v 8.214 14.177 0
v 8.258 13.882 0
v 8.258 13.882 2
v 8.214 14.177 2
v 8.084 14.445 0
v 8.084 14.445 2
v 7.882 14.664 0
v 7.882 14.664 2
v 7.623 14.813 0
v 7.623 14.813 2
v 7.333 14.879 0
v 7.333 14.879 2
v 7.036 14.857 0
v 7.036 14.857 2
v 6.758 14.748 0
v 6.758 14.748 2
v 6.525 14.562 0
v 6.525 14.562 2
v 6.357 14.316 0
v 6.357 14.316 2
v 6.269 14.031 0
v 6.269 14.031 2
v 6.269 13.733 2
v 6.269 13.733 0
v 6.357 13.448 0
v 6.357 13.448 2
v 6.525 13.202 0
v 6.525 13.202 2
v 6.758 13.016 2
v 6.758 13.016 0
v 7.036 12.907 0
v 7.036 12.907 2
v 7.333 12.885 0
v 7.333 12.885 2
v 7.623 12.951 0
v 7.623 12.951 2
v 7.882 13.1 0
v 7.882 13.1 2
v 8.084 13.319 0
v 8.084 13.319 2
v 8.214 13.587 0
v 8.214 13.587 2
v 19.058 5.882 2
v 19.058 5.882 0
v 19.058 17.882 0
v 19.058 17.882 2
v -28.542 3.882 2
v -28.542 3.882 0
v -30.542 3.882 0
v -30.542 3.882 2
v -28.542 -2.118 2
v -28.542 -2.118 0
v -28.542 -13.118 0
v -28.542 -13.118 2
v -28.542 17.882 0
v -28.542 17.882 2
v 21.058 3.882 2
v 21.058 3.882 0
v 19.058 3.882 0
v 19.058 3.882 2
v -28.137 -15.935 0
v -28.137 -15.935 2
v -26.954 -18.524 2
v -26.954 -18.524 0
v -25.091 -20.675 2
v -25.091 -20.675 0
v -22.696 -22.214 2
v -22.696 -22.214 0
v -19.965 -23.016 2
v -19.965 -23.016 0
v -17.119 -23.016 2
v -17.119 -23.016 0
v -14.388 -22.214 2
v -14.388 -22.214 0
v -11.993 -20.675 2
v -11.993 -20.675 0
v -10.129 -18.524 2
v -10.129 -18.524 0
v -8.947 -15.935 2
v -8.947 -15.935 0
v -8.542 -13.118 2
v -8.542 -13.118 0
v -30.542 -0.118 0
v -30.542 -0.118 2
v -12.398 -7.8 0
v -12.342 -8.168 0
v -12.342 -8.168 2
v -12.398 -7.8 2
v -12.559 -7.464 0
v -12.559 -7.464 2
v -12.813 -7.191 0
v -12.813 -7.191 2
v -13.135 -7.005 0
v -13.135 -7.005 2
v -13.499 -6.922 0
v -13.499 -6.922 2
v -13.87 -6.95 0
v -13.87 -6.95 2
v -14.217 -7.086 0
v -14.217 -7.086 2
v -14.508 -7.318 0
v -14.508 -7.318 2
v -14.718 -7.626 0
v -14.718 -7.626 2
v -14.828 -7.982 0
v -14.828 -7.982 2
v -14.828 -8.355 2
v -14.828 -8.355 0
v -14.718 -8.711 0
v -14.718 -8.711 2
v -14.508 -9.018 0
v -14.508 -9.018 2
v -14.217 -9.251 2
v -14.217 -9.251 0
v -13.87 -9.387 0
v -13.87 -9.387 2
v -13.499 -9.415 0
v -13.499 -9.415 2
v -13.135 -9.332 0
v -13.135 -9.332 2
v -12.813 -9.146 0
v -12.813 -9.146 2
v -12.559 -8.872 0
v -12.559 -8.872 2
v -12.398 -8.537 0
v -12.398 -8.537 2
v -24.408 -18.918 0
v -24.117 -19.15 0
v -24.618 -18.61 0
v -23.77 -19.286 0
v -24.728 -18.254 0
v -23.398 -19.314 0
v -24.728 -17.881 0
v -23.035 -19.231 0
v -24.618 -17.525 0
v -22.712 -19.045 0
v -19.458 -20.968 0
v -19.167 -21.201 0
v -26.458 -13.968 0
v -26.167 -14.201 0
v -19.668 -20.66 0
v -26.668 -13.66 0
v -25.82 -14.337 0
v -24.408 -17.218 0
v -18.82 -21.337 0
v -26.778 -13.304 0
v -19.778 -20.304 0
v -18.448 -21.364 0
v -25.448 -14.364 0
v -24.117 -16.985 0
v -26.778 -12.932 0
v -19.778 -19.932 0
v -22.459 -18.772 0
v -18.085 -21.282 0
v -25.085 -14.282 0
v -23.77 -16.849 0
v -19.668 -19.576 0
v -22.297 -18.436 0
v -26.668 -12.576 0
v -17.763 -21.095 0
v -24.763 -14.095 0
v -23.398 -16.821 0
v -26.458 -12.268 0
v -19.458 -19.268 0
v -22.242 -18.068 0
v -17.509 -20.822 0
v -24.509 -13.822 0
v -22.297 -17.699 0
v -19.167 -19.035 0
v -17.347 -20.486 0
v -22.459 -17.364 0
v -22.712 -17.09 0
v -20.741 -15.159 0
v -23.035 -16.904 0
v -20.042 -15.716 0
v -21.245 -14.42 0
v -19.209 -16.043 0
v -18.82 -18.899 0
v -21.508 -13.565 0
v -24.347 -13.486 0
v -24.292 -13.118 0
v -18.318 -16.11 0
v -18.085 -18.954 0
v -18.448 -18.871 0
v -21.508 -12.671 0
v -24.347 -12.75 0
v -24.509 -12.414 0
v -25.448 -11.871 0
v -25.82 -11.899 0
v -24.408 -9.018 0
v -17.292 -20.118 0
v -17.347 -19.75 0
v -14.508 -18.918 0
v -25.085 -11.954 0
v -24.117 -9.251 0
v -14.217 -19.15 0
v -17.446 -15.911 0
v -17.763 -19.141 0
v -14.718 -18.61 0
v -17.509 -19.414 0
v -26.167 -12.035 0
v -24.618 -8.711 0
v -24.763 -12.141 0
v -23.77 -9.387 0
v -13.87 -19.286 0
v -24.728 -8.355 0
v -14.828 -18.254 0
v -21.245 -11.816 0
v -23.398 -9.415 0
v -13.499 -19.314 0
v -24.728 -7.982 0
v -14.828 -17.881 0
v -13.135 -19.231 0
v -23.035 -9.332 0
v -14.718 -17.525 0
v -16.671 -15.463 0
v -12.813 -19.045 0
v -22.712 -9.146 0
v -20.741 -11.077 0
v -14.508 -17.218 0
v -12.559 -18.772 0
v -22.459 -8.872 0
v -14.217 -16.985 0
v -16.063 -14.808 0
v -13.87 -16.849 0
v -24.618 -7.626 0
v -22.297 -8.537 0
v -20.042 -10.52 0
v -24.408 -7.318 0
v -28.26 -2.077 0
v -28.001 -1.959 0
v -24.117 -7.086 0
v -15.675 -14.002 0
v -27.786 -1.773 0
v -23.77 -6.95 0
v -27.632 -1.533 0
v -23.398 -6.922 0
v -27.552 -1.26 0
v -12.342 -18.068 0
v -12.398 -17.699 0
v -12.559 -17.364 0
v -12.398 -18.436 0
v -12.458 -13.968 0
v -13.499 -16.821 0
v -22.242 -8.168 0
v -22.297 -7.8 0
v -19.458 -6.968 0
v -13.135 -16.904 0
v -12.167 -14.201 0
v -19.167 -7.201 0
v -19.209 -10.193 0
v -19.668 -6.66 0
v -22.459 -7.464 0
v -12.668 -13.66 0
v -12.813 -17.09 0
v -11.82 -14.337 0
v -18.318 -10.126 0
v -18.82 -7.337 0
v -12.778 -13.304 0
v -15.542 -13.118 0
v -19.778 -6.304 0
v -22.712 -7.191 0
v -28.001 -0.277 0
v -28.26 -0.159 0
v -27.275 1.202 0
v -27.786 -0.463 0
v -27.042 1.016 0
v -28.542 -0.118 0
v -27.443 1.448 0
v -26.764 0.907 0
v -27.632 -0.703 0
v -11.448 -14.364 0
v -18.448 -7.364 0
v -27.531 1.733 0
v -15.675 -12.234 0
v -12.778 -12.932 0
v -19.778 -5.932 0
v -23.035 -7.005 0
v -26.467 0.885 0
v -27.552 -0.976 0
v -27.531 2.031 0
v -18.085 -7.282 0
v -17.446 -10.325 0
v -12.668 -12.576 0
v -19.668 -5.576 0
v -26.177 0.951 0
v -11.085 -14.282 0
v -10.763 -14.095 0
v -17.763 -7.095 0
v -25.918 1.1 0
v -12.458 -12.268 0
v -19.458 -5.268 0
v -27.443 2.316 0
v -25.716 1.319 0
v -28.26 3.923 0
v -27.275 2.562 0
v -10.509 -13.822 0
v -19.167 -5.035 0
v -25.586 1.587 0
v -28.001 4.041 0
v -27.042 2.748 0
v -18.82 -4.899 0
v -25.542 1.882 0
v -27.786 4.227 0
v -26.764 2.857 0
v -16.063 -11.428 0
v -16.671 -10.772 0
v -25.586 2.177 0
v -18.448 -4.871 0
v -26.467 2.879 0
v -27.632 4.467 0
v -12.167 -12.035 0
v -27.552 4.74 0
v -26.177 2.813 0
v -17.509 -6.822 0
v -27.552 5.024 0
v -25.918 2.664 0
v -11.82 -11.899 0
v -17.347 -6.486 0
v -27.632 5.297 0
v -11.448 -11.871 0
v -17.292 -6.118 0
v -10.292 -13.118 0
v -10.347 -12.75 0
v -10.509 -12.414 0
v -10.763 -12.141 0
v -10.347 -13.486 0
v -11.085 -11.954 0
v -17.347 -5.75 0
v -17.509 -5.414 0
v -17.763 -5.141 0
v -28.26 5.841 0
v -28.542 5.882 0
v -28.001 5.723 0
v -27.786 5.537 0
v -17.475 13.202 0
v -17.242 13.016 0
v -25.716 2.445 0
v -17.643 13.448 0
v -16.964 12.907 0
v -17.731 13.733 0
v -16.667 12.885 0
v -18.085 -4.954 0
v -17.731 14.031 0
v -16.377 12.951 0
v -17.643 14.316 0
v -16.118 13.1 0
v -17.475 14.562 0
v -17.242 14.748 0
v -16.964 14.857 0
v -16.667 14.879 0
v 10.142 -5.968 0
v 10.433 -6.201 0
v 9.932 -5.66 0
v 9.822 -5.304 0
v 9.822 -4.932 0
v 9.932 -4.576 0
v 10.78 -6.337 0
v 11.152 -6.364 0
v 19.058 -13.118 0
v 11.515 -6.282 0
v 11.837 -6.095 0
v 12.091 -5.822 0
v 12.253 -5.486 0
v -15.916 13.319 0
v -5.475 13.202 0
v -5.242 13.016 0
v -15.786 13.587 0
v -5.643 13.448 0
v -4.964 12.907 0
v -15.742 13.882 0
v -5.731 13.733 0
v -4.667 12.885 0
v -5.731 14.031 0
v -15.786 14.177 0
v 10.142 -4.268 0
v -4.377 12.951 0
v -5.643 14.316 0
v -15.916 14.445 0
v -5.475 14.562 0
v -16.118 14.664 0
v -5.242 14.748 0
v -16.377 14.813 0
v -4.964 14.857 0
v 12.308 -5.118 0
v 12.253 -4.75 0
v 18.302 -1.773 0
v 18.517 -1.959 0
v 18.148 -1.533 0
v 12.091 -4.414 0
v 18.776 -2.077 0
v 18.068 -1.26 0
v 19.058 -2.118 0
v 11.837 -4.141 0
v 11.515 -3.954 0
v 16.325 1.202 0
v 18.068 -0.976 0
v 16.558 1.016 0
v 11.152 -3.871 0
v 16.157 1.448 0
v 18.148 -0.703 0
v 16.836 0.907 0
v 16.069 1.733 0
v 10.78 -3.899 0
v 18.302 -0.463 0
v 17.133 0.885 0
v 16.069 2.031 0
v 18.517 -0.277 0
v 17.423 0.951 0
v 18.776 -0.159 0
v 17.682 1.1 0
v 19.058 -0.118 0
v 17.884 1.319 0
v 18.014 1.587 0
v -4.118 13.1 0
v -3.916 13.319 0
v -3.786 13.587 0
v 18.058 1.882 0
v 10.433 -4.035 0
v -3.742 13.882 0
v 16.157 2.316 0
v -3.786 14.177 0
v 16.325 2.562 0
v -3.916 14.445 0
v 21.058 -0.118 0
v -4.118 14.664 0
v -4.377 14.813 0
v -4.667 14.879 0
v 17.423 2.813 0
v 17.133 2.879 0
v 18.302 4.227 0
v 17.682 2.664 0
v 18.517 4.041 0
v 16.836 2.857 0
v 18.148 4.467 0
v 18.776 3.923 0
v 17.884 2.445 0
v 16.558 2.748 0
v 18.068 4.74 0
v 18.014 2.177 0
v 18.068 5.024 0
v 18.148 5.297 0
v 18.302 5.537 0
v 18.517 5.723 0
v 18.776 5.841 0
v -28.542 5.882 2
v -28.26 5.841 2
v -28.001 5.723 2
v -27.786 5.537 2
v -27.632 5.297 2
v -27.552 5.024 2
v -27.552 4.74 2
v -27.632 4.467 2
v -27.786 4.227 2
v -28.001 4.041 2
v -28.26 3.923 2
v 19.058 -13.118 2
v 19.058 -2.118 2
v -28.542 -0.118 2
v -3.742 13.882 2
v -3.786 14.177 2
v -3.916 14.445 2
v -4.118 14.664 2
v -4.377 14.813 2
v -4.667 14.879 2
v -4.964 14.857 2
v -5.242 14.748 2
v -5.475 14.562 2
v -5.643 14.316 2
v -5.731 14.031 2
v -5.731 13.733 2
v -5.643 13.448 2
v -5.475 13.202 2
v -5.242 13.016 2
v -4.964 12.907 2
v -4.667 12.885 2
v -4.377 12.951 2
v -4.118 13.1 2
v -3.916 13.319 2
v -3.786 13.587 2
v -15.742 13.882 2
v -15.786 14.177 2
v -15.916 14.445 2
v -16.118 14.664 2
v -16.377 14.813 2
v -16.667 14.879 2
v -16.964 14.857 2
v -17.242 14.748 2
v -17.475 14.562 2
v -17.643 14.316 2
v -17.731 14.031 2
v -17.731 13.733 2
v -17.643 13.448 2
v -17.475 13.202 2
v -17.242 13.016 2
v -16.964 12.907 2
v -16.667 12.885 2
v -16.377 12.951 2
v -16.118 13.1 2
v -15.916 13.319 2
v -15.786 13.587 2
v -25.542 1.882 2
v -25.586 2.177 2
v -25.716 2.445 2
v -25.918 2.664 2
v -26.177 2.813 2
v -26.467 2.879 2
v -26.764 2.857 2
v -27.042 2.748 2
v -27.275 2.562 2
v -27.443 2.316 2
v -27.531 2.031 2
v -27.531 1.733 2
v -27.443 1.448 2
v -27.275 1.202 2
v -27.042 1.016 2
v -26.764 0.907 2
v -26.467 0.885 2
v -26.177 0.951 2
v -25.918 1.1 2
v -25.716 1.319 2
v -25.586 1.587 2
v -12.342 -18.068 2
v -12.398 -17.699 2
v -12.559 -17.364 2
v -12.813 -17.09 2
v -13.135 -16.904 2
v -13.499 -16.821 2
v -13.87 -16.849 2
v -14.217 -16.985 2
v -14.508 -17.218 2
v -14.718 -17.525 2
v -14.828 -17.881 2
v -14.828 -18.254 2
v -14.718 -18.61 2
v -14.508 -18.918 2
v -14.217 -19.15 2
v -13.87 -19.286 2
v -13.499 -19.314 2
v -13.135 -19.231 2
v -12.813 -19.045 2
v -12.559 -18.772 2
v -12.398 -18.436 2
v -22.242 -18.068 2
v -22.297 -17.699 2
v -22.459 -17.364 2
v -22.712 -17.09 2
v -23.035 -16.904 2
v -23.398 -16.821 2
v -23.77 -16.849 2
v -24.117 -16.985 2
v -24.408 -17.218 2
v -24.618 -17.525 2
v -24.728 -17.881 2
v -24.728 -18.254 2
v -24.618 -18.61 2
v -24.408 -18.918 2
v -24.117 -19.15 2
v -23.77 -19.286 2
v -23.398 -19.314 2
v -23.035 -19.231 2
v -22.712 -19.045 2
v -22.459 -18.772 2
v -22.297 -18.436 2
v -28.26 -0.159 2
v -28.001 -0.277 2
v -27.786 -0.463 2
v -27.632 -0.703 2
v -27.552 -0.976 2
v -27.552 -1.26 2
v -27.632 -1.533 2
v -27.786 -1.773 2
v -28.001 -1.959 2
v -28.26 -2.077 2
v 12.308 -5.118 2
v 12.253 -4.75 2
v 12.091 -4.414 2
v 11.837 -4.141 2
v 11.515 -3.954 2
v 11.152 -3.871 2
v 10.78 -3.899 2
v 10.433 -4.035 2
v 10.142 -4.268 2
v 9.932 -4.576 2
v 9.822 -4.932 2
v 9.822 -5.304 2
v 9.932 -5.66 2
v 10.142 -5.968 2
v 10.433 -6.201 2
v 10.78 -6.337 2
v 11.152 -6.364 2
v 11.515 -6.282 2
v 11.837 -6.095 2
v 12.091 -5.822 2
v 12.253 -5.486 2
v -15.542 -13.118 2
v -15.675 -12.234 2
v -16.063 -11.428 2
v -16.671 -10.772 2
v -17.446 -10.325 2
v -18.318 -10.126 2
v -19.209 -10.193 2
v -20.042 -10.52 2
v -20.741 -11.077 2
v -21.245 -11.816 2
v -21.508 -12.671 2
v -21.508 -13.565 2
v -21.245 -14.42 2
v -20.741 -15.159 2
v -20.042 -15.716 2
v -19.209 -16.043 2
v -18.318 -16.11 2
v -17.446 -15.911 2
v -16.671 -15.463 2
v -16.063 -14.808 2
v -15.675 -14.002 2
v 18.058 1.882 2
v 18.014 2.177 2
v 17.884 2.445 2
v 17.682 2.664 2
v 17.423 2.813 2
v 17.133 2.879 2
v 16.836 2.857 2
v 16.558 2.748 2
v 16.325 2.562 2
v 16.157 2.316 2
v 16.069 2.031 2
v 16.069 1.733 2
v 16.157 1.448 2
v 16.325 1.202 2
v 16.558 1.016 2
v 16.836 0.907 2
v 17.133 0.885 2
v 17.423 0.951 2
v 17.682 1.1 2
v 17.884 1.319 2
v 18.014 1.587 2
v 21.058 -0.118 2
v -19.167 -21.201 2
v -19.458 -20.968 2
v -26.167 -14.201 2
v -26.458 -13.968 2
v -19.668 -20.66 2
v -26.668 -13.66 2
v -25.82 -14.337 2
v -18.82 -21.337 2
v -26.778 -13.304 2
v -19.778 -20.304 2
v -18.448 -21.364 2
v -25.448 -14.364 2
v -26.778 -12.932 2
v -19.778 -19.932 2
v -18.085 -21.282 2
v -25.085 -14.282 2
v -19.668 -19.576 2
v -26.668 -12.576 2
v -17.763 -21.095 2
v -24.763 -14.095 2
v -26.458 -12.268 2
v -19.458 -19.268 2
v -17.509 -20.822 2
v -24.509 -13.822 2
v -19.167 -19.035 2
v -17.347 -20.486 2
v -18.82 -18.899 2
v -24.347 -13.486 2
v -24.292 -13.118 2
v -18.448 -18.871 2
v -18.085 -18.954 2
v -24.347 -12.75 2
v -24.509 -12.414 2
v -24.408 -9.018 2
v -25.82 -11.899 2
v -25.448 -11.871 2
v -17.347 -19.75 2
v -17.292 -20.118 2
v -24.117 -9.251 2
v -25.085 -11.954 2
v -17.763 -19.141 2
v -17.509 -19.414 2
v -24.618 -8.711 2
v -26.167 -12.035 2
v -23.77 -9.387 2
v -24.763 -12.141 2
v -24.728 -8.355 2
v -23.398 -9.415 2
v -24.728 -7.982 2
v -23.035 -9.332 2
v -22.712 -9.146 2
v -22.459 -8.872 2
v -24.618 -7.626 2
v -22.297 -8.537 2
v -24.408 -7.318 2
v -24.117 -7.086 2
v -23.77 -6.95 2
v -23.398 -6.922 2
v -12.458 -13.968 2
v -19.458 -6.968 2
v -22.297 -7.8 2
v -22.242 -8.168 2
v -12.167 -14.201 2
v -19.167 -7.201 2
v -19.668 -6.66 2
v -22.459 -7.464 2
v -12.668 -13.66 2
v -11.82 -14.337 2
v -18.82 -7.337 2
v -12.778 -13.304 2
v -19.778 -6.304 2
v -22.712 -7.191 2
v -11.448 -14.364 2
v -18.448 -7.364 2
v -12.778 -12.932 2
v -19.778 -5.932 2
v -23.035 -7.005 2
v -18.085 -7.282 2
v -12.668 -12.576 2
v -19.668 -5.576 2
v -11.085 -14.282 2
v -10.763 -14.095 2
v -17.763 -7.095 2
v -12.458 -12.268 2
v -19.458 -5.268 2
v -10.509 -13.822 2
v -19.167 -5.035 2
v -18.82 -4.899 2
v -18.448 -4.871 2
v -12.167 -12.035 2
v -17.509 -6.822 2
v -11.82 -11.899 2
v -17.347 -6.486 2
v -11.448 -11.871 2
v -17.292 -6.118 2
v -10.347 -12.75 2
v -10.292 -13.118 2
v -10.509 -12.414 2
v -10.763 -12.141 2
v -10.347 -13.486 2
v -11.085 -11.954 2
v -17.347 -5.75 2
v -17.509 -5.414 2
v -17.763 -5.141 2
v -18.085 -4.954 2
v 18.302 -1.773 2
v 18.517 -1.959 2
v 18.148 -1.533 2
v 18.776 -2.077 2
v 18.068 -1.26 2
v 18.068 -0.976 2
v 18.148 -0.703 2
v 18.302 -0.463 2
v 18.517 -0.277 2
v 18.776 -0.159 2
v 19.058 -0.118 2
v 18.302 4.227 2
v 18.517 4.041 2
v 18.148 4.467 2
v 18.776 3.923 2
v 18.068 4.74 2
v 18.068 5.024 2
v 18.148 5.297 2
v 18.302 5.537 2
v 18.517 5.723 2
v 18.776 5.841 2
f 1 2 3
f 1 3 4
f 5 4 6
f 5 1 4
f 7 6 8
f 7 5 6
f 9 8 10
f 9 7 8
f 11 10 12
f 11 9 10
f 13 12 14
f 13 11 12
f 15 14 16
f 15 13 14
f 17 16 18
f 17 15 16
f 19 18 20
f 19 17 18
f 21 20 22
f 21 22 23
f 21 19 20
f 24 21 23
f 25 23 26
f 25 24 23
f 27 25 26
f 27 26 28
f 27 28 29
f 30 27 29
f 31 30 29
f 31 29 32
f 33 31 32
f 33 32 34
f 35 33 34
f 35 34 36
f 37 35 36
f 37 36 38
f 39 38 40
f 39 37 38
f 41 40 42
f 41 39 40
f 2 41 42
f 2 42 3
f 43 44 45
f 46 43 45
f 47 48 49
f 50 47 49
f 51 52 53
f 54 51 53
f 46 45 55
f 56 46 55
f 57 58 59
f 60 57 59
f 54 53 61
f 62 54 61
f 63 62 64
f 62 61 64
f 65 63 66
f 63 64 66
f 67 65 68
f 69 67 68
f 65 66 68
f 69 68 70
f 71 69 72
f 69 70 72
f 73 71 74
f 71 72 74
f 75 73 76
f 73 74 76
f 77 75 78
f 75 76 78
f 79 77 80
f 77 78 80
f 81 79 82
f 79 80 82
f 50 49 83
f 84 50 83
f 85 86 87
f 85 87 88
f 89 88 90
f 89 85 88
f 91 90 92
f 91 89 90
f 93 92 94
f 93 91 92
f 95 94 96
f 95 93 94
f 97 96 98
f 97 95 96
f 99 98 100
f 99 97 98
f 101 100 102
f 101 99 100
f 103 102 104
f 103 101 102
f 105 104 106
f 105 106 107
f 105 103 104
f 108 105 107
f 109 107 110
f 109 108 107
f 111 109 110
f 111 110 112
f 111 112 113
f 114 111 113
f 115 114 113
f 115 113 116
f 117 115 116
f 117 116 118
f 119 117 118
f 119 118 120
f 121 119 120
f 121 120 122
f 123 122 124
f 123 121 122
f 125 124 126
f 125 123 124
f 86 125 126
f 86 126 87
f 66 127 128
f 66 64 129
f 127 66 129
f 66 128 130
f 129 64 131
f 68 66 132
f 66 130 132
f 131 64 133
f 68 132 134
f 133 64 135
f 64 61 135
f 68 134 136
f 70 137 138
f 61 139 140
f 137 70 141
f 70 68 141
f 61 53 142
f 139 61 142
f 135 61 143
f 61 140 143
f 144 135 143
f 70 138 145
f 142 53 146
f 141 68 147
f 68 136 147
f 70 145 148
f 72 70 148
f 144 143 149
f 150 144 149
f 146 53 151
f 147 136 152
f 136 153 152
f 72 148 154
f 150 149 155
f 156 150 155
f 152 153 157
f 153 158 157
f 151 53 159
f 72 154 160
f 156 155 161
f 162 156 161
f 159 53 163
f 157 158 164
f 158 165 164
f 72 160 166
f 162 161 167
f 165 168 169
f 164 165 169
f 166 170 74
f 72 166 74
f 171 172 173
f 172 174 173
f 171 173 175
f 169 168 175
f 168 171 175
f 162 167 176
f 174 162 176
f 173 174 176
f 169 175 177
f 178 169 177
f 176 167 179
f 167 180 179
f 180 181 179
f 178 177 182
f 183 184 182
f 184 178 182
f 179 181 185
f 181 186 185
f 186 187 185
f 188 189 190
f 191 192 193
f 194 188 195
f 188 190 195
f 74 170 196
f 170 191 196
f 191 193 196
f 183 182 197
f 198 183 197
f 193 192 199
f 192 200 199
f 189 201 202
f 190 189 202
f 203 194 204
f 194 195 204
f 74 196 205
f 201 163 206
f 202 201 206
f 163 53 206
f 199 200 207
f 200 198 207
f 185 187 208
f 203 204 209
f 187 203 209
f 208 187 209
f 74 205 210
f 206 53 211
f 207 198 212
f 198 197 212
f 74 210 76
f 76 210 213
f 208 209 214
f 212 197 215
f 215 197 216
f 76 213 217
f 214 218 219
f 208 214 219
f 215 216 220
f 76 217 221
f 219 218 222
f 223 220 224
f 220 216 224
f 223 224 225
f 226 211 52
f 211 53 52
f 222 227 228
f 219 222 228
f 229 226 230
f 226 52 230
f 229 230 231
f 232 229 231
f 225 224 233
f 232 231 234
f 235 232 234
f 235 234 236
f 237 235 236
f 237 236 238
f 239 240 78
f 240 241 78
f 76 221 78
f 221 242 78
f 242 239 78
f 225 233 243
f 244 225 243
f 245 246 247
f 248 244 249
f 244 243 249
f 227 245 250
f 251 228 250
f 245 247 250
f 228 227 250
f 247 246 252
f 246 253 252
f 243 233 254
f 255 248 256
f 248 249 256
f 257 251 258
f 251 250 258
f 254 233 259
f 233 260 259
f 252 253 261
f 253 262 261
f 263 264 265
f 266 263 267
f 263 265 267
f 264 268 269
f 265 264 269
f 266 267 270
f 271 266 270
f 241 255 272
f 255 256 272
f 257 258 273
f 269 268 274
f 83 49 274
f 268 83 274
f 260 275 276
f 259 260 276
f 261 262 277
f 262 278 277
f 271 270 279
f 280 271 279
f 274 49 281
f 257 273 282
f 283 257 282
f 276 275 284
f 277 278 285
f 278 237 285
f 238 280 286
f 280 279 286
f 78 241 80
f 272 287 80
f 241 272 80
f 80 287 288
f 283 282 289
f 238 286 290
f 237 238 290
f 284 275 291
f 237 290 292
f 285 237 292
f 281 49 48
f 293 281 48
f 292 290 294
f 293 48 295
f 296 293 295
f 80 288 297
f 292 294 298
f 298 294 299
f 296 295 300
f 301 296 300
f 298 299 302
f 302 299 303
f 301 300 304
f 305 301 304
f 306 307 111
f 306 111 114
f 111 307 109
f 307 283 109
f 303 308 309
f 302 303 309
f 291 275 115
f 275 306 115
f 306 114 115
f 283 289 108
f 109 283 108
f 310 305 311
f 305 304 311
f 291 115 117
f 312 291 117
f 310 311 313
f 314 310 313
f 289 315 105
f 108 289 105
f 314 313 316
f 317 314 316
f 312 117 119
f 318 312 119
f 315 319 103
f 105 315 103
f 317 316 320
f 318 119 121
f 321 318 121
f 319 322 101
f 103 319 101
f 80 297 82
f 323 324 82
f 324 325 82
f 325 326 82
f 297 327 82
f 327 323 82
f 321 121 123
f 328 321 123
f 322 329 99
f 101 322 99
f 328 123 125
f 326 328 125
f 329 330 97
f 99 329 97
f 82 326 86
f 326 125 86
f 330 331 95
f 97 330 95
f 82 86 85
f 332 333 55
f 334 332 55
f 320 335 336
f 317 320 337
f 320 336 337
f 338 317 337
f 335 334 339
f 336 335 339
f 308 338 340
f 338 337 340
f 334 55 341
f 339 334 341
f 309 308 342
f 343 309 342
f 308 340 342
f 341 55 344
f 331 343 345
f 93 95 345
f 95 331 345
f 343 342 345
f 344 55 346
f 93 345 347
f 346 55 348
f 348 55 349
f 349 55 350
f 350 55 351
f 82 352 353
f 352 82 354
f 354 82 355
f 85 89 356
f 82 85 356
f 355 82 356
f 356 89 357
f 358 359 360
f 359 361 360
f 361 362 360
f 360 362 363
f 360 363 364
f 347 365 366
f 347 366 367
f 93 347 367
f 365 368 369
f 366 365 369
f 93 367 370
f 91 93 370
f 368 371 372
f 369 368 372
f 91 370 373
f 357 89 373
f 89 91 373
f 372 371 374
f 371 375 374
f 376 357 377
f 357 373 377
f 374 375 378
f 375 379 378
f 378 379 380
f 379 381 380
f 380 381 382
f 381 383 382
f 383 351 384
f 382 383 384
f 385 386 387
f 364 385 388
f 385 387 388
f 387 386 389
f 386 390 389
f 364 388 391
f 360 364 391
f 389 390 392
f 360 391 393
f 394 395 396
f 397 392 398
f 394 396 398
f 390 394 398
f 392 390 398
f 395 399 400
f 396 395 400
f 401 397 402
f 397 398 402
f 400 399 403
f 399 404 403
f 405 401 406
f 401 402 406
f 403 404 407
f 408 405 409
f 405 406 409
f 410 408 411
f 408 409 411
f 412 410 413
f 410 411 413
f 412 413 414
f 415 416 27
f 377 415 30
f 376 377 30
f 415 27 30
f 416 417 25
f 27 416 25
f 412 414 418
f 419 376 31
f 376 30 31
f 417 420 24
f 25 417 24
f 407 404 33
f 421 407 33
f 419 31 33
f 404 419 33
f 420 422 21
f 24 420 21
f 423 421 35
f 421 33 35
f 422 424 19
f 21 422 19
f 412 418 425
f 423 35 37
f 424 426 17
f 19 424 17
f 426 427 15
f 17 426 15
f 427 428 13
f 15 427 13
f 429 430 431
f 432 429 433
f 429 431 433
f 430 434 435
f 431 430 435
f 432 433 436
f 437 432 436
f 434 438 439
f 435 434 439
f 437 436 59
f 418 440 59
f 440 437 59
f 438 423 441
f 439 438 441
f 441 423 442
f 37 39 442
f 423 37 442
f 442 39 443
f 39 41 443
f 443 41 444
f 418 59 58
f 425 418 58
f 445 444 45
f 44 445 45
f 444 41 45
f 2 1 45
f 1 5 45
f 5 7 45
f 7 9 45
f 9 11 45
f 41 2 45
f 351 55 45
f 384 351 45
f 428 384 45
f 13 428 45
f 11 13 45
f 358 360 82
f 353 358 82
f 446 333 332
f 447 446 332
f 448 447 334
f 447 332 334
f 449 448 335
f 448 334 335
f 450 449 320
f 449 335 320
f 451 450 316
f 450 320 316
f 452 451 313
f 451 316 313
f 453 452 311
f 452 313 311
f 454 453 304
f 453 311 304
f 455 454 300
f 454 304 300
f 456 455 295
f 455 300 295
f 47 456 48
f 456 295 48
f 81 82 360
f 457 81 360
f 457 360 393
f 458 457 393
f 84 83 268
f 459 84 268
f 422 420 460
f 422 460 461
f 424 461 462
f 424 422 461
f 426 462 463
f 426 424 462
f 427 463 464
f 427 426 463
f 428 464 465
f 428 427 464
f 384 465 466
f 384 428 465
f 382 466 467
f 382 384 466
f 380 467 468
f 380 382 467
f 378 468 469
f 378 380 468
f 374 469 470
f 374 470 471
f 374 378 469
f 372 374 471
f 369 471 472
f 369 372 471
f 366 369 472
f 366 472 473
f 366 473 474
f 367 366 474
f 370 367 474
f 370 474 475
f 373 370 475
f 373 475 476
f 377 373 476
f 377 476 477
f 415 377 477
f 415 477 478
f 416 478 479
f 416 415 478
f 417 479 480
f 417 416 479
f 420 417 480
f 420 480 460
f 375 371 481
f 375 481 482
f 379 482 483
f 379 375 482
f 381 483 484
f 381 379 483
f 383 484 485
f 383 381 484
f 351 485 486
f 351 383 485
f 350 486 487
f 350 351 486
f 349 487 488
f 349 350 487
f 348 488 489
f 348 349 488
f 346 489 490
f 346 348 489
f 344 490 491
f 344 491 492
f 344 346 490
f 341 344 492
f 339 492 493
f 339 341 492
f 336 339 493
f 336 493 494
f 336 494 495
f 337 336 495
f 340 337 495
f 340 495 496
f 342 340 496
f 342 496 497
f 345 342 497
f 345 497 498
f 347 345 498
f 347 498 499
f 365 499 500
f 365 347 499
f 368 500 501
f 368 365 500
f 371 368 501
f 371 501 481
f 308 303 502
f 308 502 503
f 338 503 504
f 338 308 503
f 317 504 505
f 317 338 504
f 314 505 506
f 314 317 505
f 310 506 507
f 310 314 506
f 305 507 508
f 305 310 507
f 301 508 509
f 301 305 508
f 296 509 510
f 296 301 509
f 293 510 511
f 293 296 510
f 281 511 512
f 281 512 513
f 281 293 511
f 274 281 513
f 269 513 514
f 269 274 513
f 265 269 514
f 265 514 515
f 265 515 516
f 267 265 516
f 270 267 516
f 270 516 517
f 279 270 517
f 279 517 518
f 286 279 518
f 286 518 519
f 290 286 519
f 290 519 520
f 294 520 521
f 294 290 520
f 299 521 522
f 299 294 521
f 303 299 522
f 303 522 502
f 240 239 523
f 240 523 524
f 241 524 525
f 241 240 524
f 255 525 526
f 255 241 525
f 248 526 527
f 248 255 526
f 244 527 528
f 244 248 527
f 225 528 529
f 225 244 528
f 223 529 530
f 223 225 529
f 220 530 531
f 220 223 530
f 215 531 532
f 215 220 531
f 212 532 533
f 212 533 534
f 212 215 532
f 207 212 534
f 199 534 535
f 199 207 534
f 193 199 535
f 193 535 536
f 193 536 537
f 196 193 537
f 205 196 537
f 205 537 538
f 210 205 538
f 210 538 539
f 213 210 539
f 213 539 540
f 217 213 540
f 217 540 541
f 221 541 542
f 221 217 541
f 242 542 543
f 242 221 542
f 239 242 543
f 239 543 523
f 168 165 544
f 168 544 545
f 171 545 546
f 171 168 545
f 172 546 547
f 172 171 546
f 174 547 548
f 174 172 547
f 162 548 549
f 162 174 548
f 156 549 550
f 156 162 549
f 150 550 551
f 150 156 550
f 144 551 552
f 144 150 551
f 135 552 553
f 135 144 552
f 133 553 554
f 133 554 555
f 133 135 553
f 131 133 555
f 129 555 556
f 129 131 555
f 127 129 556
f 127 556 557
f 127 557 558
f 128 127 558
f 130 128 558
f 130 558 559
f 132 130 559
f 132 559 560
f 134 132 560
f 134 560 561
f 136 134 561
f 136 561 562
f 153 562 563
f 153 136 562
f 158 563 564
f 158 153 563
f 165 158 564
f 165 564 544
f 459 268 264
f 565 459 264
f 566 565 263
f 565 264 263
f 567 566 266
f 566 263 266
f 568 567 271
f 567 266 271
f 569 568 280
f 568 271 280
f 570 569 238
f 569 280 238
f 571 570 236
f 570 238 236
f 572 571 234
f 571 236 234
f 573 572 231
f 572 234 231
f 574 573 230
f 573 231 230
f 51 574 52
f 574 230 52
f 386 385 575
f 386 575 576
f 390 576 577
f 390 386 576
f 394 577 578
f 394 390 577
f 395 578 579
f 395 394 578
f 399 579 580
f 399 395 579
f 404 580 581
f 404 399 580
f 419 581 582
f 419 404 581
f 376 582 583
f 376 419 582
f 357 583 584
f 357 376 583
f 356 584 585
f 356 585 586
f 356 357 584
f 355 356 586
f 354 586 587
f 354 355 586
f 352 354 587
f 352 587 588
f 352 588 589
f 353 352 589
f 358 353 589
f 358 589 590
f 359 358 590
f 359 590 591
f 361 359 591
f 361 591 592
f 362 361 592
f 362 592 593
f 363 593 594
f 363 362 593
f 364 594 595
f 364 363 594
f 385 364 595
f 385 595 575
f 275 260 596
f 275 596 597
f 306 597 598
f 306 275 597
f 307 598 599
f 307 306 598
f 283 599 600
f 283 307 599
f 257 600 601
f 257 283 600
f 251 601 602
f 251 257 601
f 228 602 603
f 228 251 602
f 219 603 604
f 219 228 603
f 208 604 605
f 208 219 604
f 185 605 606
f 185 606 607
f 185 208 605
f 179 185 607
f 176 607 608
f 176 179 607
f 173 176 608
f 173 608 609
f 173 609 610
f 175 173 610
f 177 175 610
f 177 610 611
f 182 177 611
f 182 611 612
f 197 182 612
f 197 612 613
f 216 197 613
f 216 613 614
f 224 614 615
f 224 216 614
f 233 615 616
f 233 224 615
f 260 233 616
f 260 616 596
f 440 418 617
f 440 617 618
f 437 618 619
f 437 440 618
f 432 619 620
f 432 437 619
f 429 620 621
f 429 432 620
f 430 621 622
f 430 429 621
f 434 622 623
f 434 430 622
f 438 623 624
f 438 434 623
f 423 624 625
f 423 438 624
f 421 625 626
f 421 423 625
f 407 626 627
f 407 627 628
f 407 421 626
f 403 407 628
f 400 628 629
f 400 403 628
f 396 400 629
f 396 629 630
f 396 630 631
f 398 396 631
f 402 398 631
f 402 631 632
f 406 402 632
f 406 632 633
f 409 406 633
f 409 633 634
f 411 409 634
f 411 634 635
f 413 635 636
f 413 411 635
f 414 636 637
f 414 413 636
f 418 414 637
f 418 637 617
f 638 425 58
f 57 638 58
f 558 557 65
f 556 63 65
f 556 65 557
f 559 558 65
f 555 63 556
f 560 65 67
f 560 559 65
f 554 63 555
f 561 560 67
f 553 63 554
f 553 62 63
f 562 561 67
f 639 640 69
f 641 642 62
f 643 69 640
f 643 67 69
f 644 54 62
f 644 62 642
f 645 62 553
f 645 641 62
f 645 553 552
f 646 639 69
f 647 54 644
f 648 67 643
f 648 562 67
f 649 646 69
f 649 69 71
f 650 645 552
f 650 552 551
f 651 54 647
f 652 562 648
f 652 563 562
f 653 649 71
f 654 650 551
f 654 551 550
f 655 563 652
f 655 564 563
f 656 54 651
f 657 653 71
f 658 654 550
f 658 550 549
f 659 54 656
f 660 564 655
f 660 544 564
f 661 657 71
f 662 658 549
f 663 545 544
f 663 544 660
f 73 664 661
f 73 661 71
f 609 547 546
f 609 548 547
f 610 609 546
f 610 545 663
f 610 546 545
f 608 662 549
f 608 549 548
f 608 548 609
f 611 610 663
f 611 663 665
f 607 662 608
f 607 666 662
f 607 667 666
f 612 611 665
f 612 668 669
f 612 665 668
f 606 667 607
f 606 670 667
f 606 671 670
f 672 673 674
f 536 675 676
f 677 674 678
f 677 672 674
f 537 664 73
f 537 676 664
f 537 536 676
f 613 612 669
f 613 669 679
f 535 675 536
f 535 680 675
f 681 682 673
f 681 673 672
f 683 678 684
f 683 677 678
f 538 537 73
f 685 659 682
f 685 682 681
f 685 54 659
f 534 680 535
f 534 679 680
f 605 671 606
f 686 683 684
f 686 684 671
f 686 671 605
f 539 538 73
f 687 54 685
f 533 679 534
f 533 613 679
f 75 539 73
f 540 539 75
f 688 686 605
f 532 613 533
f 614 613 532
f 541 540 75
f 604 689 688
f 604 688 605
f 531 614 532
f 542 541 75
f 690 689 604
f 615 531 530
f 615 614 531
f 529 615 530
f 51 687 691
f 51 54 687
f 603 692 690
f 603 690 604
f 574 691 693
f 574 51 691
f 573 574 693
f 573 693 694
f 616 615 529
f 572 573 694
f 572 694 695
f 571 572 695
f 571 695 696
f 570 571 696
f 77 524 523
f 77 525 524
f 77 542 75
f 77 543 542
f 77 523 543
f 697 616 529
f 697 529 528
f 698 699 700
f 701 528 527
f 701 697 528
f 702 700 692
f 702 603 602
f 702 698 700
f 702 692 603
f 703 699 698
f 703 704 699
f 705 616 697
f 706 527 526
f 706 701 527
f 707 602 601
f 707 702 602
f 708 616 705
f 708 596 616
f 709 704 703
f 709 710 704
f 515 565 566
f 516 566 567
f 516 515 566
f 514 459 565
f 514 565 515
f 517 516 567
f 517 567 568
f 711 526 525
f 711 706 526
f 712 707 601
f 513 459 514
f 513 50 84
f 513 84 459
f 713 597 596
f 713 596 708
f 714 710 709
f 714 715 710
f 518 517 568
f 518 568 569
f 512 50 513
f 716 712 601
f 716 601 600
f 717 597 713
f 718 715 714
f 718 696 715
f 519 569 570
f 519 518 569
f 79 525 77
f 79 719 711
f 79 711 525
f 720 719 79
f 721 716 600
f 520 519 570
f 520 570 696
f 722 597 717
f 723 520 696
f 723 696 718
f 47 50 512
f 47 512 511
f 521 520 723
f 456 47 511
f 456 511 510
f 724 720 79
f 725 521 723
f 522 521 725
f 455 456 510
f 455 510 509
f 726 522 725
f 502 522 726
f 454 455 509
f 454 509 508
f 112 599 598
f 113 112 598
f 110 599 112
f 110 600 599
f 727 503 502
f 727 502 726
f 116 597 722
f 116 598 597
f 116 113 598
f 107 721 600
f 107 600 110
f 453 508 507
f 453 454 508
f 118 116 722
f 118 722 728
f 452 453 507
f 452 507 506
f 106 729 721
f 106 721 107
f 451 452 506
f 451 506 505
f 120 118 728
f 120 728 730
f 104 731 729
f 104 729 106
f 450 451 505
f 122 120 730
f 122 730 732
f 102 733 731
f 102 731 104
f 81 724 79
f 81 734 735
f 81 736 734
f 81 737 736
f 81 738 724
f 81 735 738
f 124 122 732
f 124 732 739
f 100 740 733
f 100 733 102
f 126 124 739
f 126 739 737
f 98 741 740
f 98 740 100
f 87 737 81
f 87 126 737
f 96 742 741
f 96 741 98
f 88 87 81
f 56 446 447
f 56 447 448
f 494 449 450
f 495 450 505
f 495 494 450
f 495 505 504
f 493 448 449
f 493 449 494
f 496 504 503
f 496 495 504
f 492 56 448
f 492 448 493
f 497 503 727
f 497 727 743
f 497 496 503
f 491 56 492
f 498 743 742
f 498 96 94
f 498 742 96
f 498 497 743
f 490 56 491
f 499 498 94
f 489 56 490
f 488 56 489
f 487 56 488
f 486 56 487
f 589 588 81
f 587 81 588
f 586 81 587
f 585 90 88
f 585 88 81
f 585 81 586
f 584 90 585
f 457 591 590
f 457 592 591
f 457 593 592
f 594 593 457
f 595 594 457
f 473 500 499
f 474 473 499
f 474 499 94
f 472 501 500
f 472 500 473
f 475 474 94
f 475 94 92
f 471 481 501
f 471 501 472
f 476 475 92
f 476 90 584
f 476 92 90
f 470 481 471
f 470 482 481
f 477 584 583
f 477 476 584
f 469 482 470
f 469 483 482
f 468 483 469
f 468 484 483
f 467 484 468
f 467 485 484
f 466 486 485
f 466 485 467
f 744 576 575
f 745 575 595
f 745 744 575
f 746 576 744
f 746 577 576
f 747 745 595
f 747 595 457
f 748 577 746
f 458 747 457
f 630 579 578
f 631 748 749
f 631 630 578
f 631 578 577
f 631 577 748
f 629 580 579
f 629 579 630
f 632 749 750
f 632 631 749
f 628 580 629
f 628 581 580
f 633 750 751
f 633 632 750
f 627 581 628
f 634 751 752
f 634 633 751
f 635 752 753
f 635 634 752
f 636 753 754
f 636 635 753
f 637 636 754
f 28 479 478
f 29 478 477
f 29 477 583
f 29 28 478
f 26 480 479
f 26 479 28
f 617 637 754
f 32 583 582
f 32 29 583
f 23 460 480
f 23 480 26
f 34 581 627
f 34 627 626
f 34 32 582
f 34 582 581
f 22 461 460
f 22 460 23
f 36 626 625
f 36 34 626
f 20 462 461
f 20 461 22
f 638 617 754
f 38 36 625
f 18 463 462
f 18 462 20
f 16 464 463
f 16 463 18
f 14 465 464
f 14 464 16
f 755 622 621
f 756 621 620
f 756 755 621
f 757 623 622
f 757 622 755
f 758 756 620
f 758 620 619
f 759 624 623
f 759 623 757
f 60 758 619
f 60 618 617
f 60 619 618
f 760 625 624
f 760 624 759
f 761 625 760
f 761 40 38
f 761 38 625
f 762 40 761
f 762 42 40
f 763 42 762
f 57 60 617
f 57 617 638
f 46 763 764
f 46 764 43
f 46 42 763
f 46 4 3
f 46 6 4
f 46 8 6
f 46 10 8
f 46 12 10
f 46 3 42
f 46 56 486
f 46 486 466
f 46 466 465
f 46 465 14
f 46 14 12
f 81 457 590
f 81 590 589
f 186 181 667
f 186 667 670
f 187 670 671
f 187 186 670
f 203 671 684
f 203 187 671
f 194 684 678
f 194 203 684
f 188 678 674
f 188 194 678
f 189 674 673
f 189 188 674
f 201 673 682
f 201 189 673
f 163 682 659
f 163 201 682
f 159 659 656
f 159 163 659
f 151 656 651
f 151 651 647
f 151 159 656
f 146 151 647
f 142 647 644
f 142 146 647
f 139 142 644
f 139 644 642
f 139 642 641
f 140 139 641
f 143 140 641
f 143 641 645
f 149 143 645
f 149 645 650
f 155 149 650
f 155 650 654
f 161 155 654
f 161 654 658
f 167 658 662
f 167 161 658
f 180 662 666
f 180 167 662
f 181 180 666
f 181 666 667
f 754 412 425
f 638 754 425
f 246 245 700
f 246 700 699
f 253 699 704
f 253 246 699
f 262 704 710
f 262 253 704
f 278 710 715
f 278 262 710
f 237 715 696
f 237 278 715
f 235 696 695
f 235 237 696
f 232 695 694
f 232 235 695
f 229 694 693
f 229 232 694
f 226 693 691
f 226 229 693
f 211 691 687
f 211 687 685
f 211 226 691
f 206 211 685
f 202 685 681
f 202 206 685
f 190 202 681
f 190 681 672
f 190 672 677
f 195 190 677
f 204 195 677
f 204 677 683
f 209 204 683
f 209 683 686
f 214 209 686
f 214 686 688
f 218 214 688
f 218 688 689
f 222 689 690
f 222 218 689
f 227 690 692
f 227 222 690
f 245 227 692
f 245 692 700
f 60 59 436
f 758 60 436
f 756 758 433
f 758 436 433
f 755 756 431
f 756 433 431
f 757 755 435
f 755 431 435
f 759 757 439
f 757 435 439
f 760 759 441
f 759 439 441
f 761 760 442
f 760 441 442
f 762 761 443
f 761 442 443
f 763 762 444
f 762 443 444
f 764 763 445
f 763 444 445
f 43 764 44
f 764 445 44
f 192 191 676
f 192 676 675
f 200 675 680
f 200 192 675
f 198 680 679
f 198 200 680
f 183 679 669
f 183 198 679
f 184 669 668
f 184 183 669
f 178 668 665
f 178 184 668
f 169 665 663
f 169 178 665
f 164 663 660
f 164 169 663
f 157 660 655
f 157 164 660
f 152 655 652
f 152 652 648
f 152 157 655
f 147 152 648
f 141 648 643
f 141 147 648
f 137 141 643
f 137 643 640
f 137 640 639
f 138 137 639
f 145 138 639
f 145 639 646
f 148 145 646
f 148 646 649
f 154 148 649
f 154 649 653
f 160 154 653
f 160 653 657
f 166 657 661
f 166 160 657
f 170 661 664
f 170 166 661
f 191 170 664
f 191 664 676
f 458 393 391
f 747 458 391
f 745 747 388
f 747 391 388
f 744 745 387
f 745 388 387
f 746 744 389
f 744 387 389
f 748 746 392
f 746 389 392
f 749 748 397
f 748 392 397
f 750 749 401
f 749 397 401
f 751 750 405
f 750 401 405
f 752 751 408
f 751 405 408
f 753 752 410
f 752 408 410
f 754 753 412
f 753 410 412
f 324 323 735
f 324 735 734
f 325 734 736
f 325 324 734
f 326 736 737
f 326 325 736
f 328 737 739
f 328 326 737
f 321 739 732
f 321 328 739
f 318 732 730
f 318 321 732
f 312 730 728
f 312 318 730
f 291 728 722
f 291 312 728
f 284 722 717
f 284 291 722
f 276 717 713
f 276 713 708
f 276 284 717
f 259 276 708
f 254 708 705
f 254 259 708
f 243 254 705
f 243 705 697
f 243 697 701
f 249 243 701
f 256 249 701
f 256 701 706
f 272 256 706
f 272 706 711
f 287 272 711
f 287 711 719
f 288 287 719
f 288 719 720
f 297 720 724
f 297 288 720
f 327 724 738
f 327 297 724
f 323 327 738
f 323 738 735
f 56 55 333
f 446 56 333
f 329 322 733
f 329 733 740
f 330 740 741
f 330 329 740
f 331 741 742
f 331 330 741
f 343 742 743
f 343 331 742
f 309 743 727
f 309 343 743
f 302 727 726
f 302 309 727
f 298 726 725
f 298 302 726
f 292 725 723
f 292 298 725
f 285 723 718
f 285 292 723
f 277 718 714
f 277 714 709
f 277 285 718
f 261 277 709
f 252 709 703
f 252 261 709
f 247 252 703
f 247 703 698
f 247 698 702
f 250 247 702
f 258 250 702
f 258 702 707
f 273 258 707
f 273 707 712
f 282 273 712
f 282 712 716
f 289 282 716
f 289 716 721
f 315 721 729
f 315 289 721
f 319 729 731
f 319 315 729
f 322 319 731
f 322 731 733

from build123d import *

# Parameters (mm, degrees)
SKETCH_1_R      = 3
SKETCH_1_R_2    = 1.25
SKETCH_1_R_3    = 1
EXTRUDE_2_DEPTH = 2


with BuildPart() as part:
    # 草圖1 → 填料-伸長2 (new body)
    with BuildSketch(Plane.XY):
        with BuildLine():
            Line((-7.587453917, -13.1179941), (18.058094933, -13.1179941))
            Line((18.058094933, -13.1179941), (19.058094933, -13.1179941))
            Line((19.058094933, -13.1179941), (19.058094933, -12.1179941))
            Line((19.058094933, -12.1179941), (19.058094933, -2.1179941))
            ThreePointArc((19.058094933, -2.1179941), (18.058094933, -1.1179941), (19.058094933, -0.1179941))
            Line((19.058094933, -0.1179941), (21.058094933, -0.1179941))
            Line((21.058094933, -0.1179941), (21.058094933, 3.8820059))
            Line((21.058094933, 3.8820059), (19.058094933, 3.8820059))
            ThreePointArc((19.058094933, 3.8820059), (18.058094933, 4.8820059), (19.058094933, 5.8820059))
            Line((19.058094933, 5.8820059), (19.058094933, 9.8820059))
            Line((19.058094933, 9.8820059), (19.058094933, 10.8820059))
            Line((19.058094933, 10.8820059), (19.058094933, 16.8820059))
            Line((19.058094933, 16.8820059), (19.058094933, 17.8820059))
            Line((19.058094933, 17.8820059), (18.058094933, 17.8820059))
            Line((18.058094933, 17.8820059), (-27.541905067, 17.8820059))
            Line((-27.541905067, 17.8820059), (-28.541905067, 17.8820059))
            Line((-28.541905067, 17.8820059), (-28.541905067, 16.8820059))
            Line((-28.541905067, 16.8820059), (-28.541905067, 10.8820059))
            Line((-28.541905067, 10.8820059), (-28.541905067, 9.8820059))
            Line((-28.541905067, 9.8820059), (-28.541905067, 5.8820059))
            ThreePointArc((-28.541905067, 5.8820059), (-27.541905067, 4.8820059), (-28.541905067, 3.8820059))
            Line((-28.541905067, 3.8820059), (-30.541905067, 3.8820059))
            Line((-30.541905067, 3.8820059), (-30.541905067, -0.1179941))
            Line((-30.541905067, -0.1179941), (-28.541905067, -0.1179941))
            ThreePointArc((-28.541905067, -0.1179941), (-27.541905067, -1.1179941), (-28.541905067, -2.1179941))
            Line((-28.541905067, -2.1179941), (-28.541905067, -13.1179941))
            ThreePointArc((-28.541905067, -13.1179941), (-18.541905067, -23.1179941), (-8.541905067, -13.1179941))
            Line((-8.541905067, -13.1179941), (-7.587453917, -13.1179941))
        make_face()
        with Locations((-18.541905067, -13.1179941)):
            Circle(SKETCH_1_R, mode=Mode.SUBTRACT)
        with Locations((-18.541905067, -6.1179941)):
            Circle(SKETCH_1_R_2, mode=Mode.SUBTRACT)
        with Locations((-13.592157599, -8.168246632)):
            Circle(SKETCH_1_R_2, mode=Mode.SUBTRACT)
        with Locations((-11.541905067, -13.1179941)):
            Circle(SKETCH_1_R_2, mode=Mode.SUBTRACT)
        with Locations((-13.592157599, -18.067741569)):
            Circle(SKETCH_1_R_2, mode=Mode.SUBTRACT)
        with Locations((-18.541905067, -20.1179941)):
            Circle(SKETCH_1_R_2, mode=Mode.SUBTRACT)
        with Locations((-23.491652536, -18.067741569)):
            Circle(SKETCH_1_R_2, mode=Mode.SUBTRACT)
        with Locations((-25.541905067, -13.1179941)):
            Circle(SKETCH_1_R_2, mode=Mode.SUBTRACT)
        with Locations((-23.491652536, -8.168246632)):
            Circle(SKETCH_1_R_2, mode=Mode.SUBTRACT)
        with Locations((-26.541905067, 1.8820059)):
            Circle(SKETCH_1_R_3, mode=Mode.SUBTRACT)
        with Locations((17.058094933, 1.8820059)):
            Circle(SKETCH_1_R_3, mode=Mode.SUBTRACT)
        with Locations((-4.741905067, 13.8820059)):
            Circle(SKETCH_1_R_3, mode=Mode.SUBTRACT)
        with Locations((11.058094933, -5.1179941)):
            Circle(SKETCH_1_R_2, mode=Mode.SUBTRACT)
        with Locations((-16.741905067, 13.8820059)):
            Circle(SKETCH_1_R_3, mode=Mode.SUBTRACT)
        with Locations((7.258094933, 13.8820059)):
            Circle(SKETCH_1_R_3, mode=Mode.SUBTRACT)
    extrude(amount=EXTRUDE_2_DEPTH)


solid = part.part
